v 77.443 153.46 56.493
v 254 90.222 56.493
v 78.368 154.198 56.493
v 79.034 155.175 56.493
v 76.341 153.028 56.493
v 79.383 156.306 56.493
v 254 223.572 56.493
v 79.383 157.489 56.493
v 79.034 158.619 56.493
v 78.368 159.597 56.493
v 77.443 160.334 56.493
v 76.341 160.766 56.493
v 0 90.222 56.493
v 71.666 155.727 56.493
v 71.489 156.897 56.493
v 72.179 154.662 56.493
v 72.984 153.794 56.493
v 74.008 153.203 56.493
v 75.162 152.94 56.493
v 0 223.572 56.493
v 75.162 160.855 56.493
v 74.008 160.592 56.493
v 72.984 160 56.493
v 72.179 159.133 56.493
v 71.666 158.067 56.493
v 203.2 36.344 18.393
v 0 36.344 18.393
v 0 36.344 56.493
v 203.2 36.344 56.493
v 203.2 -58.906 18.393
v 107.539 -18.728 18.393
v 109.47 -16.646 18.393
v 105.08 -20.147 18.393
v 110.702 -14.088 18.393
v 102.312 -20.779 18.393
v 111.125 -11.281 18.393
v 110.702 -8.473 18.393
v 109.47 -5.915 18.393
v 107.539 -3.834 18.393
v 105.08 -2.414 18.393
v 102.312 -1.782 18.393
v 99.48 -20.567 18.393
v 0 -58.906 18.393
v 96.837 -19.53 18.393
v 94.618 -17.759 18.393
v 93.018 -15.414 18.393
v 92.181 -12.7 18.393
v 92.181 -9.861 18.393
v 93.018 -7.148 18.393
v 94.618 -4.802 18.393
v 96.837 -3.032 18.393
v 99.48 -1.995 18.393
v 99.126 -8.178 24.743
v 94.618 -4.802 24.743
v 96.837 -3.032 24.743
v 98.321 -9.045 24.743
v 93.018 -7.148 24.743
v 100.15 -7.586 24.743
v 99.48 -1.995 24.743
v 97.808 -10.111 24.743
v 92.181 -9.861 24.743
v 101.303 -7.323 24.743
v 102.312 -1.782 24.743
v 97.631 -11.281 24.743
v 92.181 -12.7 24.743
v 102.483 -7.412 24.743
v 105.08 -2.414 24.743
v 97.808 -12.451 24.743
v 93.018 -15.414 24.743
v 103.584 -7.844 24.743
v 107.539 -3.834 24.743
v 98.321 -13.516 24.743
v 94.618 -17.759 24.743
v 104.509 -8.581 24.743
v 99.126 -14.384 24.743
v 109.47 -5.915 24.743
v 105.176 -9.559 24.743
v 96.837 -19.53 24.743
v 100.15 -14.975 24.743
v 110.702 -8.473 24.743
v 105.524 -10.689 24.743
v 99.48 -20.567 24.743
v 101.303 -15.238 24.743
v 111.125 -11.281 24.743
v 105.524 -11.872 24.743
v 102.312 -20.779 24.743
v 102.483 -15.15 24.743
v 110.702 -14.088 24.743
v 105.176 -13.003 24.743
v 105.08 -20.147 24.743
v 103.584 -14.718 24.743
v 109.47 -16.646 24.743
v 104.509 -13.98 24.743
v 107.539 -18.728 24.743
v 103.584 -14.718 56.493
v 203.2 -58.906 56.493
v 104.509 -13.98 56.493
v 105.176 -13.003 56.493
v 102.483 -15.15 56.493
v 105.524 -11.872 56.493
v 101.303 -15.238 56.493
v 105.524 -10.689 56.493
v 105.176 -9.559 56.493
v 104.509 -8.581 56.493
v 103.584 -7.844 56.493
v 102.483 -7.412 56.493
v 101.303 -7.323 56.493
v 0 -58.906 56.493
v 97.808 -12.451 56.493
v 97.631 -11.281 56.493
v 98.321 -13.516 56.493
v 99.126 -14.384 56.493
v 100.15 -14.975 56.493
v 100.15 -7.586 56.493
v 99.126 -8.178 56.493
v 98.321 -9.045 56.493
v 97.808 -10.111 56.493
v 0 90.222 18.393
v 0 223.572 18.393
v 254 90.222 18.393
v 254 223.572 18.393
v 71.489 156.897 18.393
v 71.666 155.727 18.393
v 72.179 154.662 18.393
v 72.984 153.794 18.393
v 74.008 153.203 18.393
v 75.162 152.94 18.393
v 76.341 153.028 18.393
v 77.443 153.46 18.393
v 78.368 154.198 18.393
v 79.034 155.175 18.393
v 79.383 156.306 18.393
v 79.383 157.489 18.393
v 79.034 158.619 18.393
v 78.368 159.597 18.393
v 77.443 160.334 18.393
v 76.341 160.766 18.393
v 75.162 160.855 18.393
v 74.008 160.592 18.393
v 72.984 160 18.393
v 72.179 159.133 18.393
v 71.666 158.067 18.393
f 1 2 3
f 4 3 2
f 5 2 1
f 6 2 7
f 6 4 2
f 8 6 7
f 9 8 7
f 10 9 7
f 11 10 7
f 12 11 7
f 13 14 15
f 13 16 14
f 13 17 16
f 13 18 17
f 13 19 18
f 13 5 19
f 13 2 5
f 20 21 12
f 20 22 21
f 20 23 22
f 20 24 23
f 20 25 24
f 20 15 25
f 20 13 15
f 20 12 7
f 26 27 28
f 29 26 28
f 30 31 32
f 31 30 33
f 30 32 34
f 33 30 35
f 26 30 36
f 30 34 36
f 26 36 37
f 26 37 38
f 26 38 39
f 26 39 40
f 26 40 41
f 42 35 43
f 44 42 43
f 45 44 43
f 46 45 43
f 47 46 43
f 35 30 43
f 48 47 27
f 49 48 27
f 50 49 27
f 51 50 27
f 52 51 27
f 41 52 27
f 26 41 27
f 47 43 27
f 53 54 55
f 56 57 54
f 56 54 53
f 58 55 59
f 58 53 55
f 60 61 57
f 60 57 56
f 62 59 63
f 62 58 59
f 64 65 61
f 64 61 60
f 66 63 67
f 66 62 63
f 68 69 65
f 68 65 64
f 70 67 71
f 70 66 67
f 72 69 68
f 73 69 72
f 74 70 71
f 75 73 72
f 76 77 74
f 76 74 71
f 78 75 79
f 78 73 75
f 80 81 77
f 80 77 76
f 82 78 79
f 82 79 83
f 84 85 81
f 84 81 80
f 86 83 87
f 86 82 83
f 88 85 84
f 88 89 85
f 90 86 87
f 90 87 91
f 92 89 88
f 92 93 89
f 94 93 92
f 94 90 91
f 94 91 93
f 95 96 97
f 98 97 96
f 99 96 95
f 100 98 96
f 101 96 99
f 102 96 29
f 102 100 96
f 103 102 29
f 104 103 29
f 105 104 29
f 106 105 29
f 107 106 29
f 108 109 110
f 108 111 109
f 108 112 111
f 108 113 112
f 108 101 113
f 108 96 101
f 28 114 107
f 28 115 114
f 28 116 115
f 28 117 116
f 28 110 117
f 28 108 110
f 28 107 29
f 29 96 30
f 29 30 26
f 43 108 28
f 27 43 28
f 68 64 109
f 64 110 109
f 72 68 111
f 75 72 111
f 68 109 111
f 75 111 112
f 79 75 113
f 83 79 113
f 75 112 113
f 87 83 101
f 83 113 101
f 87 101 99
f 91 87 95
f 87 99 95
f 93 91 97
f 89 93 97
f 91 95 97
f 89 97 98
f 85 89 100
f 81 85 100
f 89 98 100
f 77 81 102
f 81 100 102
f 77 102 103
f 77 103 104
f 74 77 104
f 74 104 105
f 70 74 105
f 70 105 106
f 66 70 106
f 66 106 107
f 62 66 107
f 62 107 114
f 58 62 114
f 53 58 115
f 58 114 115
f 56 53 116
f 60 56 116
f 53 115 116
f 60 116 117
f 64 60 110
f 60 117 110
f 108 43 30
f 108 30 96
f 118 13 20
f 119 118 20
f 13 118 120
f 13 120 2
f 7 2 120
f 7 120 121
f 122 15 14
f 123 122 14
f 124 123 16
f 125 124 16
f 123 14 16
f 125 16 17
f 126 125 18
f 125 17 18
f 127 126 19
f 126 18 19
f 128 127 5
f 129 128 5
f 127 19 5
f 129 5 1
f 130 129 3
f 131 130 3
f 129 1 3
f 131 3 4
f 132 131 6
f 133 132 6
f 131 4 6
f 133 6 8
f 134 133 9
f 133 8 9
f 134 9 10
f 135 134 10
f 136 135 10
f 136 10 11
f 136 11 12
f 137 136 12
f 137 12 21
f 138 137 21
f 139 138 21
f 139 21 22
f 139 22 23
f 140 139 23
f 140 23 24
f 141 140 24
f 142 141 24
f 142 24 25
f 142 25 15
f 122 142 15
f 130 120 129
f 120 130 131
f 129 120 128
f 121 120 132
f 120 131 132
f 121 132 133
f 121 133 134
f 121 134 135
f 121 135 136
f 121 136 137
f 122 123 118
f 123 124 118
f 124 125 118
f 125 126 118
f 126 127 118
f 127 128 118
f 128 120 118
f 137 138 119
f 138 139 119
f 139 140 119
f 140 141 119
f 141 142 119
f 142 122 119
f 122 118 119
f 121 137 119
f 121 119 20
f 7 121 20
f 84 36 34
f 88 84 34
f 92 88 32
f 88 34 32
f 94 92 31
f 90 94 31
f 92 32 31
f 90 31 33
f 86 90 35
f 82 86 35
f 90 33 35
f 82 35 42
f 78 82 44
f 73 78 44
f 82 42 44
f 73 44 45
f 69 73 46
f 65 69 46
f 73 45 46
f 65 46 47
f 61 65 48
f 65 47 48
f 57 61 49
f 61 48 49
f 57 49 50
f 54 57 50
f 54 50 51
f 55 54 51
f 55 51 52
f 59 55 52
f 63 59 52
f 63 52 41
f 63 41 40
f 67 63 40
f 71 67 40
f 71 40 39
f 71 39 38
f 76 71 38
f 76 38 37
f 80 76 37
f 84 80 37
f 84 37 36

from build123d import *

# Parameters (mm, degrees)
F0_W           = 95.25
F0_H           = 38.1
F1_DEPTH       = 203.2
F0_W_2         = 133.35
F2_DEPTH       = 254
F4_D           = 7.9375
F4_START       = 18.3927056
F4_CBORE_D     = 19.05
F4_CBORE_DEPTH = 6.35
F5_D           = 7.9375


with BuildPart() as f1:
    # F0 (on Right) → F1 (new body)
    with BuildSketch(Plane.YZ):
        with Locations((-11.2807874495, 37.442705594)):
            Rectangle(F0_W, F0_H)
    extrude(amount=F1_DEPTH)

    # F4 (through all)
    # its depths count from where the whole tool has entered the part; down to there all is cleared
    with Locations(Plane(origin=(0, 0, 0), x_dir=(1, 0, 0), z_dir=(0, 0, -1)).offset(-F4_START)):
        with Locations((101.6, 11.2807874495)):
            CounterBoreHole(F4_D / 2, F4_CBORE_D / 2, F4_CBORE_DEPTH)


with BuildPart() as f2:
    # F0 (on Right) → F2 (new body)
    with BuildSketch(Plane.YZ):
        with Locations((156.8971798897, 37.442705594)):
            Rectangle(F0_W_2, F0_H)
    extrude(amount=F2_DEPTH)

    # F5 (through all)
    with Locations(Plane(origin=(0, 0, 0), x_dir=(1, 0, 0), z_dir=(0, 0, -1))):
        with Locations((75.4582360387, -156.8971798897)):
            Hole(F5_D / 2)


solid = Compound([f1.part, f2.part])
